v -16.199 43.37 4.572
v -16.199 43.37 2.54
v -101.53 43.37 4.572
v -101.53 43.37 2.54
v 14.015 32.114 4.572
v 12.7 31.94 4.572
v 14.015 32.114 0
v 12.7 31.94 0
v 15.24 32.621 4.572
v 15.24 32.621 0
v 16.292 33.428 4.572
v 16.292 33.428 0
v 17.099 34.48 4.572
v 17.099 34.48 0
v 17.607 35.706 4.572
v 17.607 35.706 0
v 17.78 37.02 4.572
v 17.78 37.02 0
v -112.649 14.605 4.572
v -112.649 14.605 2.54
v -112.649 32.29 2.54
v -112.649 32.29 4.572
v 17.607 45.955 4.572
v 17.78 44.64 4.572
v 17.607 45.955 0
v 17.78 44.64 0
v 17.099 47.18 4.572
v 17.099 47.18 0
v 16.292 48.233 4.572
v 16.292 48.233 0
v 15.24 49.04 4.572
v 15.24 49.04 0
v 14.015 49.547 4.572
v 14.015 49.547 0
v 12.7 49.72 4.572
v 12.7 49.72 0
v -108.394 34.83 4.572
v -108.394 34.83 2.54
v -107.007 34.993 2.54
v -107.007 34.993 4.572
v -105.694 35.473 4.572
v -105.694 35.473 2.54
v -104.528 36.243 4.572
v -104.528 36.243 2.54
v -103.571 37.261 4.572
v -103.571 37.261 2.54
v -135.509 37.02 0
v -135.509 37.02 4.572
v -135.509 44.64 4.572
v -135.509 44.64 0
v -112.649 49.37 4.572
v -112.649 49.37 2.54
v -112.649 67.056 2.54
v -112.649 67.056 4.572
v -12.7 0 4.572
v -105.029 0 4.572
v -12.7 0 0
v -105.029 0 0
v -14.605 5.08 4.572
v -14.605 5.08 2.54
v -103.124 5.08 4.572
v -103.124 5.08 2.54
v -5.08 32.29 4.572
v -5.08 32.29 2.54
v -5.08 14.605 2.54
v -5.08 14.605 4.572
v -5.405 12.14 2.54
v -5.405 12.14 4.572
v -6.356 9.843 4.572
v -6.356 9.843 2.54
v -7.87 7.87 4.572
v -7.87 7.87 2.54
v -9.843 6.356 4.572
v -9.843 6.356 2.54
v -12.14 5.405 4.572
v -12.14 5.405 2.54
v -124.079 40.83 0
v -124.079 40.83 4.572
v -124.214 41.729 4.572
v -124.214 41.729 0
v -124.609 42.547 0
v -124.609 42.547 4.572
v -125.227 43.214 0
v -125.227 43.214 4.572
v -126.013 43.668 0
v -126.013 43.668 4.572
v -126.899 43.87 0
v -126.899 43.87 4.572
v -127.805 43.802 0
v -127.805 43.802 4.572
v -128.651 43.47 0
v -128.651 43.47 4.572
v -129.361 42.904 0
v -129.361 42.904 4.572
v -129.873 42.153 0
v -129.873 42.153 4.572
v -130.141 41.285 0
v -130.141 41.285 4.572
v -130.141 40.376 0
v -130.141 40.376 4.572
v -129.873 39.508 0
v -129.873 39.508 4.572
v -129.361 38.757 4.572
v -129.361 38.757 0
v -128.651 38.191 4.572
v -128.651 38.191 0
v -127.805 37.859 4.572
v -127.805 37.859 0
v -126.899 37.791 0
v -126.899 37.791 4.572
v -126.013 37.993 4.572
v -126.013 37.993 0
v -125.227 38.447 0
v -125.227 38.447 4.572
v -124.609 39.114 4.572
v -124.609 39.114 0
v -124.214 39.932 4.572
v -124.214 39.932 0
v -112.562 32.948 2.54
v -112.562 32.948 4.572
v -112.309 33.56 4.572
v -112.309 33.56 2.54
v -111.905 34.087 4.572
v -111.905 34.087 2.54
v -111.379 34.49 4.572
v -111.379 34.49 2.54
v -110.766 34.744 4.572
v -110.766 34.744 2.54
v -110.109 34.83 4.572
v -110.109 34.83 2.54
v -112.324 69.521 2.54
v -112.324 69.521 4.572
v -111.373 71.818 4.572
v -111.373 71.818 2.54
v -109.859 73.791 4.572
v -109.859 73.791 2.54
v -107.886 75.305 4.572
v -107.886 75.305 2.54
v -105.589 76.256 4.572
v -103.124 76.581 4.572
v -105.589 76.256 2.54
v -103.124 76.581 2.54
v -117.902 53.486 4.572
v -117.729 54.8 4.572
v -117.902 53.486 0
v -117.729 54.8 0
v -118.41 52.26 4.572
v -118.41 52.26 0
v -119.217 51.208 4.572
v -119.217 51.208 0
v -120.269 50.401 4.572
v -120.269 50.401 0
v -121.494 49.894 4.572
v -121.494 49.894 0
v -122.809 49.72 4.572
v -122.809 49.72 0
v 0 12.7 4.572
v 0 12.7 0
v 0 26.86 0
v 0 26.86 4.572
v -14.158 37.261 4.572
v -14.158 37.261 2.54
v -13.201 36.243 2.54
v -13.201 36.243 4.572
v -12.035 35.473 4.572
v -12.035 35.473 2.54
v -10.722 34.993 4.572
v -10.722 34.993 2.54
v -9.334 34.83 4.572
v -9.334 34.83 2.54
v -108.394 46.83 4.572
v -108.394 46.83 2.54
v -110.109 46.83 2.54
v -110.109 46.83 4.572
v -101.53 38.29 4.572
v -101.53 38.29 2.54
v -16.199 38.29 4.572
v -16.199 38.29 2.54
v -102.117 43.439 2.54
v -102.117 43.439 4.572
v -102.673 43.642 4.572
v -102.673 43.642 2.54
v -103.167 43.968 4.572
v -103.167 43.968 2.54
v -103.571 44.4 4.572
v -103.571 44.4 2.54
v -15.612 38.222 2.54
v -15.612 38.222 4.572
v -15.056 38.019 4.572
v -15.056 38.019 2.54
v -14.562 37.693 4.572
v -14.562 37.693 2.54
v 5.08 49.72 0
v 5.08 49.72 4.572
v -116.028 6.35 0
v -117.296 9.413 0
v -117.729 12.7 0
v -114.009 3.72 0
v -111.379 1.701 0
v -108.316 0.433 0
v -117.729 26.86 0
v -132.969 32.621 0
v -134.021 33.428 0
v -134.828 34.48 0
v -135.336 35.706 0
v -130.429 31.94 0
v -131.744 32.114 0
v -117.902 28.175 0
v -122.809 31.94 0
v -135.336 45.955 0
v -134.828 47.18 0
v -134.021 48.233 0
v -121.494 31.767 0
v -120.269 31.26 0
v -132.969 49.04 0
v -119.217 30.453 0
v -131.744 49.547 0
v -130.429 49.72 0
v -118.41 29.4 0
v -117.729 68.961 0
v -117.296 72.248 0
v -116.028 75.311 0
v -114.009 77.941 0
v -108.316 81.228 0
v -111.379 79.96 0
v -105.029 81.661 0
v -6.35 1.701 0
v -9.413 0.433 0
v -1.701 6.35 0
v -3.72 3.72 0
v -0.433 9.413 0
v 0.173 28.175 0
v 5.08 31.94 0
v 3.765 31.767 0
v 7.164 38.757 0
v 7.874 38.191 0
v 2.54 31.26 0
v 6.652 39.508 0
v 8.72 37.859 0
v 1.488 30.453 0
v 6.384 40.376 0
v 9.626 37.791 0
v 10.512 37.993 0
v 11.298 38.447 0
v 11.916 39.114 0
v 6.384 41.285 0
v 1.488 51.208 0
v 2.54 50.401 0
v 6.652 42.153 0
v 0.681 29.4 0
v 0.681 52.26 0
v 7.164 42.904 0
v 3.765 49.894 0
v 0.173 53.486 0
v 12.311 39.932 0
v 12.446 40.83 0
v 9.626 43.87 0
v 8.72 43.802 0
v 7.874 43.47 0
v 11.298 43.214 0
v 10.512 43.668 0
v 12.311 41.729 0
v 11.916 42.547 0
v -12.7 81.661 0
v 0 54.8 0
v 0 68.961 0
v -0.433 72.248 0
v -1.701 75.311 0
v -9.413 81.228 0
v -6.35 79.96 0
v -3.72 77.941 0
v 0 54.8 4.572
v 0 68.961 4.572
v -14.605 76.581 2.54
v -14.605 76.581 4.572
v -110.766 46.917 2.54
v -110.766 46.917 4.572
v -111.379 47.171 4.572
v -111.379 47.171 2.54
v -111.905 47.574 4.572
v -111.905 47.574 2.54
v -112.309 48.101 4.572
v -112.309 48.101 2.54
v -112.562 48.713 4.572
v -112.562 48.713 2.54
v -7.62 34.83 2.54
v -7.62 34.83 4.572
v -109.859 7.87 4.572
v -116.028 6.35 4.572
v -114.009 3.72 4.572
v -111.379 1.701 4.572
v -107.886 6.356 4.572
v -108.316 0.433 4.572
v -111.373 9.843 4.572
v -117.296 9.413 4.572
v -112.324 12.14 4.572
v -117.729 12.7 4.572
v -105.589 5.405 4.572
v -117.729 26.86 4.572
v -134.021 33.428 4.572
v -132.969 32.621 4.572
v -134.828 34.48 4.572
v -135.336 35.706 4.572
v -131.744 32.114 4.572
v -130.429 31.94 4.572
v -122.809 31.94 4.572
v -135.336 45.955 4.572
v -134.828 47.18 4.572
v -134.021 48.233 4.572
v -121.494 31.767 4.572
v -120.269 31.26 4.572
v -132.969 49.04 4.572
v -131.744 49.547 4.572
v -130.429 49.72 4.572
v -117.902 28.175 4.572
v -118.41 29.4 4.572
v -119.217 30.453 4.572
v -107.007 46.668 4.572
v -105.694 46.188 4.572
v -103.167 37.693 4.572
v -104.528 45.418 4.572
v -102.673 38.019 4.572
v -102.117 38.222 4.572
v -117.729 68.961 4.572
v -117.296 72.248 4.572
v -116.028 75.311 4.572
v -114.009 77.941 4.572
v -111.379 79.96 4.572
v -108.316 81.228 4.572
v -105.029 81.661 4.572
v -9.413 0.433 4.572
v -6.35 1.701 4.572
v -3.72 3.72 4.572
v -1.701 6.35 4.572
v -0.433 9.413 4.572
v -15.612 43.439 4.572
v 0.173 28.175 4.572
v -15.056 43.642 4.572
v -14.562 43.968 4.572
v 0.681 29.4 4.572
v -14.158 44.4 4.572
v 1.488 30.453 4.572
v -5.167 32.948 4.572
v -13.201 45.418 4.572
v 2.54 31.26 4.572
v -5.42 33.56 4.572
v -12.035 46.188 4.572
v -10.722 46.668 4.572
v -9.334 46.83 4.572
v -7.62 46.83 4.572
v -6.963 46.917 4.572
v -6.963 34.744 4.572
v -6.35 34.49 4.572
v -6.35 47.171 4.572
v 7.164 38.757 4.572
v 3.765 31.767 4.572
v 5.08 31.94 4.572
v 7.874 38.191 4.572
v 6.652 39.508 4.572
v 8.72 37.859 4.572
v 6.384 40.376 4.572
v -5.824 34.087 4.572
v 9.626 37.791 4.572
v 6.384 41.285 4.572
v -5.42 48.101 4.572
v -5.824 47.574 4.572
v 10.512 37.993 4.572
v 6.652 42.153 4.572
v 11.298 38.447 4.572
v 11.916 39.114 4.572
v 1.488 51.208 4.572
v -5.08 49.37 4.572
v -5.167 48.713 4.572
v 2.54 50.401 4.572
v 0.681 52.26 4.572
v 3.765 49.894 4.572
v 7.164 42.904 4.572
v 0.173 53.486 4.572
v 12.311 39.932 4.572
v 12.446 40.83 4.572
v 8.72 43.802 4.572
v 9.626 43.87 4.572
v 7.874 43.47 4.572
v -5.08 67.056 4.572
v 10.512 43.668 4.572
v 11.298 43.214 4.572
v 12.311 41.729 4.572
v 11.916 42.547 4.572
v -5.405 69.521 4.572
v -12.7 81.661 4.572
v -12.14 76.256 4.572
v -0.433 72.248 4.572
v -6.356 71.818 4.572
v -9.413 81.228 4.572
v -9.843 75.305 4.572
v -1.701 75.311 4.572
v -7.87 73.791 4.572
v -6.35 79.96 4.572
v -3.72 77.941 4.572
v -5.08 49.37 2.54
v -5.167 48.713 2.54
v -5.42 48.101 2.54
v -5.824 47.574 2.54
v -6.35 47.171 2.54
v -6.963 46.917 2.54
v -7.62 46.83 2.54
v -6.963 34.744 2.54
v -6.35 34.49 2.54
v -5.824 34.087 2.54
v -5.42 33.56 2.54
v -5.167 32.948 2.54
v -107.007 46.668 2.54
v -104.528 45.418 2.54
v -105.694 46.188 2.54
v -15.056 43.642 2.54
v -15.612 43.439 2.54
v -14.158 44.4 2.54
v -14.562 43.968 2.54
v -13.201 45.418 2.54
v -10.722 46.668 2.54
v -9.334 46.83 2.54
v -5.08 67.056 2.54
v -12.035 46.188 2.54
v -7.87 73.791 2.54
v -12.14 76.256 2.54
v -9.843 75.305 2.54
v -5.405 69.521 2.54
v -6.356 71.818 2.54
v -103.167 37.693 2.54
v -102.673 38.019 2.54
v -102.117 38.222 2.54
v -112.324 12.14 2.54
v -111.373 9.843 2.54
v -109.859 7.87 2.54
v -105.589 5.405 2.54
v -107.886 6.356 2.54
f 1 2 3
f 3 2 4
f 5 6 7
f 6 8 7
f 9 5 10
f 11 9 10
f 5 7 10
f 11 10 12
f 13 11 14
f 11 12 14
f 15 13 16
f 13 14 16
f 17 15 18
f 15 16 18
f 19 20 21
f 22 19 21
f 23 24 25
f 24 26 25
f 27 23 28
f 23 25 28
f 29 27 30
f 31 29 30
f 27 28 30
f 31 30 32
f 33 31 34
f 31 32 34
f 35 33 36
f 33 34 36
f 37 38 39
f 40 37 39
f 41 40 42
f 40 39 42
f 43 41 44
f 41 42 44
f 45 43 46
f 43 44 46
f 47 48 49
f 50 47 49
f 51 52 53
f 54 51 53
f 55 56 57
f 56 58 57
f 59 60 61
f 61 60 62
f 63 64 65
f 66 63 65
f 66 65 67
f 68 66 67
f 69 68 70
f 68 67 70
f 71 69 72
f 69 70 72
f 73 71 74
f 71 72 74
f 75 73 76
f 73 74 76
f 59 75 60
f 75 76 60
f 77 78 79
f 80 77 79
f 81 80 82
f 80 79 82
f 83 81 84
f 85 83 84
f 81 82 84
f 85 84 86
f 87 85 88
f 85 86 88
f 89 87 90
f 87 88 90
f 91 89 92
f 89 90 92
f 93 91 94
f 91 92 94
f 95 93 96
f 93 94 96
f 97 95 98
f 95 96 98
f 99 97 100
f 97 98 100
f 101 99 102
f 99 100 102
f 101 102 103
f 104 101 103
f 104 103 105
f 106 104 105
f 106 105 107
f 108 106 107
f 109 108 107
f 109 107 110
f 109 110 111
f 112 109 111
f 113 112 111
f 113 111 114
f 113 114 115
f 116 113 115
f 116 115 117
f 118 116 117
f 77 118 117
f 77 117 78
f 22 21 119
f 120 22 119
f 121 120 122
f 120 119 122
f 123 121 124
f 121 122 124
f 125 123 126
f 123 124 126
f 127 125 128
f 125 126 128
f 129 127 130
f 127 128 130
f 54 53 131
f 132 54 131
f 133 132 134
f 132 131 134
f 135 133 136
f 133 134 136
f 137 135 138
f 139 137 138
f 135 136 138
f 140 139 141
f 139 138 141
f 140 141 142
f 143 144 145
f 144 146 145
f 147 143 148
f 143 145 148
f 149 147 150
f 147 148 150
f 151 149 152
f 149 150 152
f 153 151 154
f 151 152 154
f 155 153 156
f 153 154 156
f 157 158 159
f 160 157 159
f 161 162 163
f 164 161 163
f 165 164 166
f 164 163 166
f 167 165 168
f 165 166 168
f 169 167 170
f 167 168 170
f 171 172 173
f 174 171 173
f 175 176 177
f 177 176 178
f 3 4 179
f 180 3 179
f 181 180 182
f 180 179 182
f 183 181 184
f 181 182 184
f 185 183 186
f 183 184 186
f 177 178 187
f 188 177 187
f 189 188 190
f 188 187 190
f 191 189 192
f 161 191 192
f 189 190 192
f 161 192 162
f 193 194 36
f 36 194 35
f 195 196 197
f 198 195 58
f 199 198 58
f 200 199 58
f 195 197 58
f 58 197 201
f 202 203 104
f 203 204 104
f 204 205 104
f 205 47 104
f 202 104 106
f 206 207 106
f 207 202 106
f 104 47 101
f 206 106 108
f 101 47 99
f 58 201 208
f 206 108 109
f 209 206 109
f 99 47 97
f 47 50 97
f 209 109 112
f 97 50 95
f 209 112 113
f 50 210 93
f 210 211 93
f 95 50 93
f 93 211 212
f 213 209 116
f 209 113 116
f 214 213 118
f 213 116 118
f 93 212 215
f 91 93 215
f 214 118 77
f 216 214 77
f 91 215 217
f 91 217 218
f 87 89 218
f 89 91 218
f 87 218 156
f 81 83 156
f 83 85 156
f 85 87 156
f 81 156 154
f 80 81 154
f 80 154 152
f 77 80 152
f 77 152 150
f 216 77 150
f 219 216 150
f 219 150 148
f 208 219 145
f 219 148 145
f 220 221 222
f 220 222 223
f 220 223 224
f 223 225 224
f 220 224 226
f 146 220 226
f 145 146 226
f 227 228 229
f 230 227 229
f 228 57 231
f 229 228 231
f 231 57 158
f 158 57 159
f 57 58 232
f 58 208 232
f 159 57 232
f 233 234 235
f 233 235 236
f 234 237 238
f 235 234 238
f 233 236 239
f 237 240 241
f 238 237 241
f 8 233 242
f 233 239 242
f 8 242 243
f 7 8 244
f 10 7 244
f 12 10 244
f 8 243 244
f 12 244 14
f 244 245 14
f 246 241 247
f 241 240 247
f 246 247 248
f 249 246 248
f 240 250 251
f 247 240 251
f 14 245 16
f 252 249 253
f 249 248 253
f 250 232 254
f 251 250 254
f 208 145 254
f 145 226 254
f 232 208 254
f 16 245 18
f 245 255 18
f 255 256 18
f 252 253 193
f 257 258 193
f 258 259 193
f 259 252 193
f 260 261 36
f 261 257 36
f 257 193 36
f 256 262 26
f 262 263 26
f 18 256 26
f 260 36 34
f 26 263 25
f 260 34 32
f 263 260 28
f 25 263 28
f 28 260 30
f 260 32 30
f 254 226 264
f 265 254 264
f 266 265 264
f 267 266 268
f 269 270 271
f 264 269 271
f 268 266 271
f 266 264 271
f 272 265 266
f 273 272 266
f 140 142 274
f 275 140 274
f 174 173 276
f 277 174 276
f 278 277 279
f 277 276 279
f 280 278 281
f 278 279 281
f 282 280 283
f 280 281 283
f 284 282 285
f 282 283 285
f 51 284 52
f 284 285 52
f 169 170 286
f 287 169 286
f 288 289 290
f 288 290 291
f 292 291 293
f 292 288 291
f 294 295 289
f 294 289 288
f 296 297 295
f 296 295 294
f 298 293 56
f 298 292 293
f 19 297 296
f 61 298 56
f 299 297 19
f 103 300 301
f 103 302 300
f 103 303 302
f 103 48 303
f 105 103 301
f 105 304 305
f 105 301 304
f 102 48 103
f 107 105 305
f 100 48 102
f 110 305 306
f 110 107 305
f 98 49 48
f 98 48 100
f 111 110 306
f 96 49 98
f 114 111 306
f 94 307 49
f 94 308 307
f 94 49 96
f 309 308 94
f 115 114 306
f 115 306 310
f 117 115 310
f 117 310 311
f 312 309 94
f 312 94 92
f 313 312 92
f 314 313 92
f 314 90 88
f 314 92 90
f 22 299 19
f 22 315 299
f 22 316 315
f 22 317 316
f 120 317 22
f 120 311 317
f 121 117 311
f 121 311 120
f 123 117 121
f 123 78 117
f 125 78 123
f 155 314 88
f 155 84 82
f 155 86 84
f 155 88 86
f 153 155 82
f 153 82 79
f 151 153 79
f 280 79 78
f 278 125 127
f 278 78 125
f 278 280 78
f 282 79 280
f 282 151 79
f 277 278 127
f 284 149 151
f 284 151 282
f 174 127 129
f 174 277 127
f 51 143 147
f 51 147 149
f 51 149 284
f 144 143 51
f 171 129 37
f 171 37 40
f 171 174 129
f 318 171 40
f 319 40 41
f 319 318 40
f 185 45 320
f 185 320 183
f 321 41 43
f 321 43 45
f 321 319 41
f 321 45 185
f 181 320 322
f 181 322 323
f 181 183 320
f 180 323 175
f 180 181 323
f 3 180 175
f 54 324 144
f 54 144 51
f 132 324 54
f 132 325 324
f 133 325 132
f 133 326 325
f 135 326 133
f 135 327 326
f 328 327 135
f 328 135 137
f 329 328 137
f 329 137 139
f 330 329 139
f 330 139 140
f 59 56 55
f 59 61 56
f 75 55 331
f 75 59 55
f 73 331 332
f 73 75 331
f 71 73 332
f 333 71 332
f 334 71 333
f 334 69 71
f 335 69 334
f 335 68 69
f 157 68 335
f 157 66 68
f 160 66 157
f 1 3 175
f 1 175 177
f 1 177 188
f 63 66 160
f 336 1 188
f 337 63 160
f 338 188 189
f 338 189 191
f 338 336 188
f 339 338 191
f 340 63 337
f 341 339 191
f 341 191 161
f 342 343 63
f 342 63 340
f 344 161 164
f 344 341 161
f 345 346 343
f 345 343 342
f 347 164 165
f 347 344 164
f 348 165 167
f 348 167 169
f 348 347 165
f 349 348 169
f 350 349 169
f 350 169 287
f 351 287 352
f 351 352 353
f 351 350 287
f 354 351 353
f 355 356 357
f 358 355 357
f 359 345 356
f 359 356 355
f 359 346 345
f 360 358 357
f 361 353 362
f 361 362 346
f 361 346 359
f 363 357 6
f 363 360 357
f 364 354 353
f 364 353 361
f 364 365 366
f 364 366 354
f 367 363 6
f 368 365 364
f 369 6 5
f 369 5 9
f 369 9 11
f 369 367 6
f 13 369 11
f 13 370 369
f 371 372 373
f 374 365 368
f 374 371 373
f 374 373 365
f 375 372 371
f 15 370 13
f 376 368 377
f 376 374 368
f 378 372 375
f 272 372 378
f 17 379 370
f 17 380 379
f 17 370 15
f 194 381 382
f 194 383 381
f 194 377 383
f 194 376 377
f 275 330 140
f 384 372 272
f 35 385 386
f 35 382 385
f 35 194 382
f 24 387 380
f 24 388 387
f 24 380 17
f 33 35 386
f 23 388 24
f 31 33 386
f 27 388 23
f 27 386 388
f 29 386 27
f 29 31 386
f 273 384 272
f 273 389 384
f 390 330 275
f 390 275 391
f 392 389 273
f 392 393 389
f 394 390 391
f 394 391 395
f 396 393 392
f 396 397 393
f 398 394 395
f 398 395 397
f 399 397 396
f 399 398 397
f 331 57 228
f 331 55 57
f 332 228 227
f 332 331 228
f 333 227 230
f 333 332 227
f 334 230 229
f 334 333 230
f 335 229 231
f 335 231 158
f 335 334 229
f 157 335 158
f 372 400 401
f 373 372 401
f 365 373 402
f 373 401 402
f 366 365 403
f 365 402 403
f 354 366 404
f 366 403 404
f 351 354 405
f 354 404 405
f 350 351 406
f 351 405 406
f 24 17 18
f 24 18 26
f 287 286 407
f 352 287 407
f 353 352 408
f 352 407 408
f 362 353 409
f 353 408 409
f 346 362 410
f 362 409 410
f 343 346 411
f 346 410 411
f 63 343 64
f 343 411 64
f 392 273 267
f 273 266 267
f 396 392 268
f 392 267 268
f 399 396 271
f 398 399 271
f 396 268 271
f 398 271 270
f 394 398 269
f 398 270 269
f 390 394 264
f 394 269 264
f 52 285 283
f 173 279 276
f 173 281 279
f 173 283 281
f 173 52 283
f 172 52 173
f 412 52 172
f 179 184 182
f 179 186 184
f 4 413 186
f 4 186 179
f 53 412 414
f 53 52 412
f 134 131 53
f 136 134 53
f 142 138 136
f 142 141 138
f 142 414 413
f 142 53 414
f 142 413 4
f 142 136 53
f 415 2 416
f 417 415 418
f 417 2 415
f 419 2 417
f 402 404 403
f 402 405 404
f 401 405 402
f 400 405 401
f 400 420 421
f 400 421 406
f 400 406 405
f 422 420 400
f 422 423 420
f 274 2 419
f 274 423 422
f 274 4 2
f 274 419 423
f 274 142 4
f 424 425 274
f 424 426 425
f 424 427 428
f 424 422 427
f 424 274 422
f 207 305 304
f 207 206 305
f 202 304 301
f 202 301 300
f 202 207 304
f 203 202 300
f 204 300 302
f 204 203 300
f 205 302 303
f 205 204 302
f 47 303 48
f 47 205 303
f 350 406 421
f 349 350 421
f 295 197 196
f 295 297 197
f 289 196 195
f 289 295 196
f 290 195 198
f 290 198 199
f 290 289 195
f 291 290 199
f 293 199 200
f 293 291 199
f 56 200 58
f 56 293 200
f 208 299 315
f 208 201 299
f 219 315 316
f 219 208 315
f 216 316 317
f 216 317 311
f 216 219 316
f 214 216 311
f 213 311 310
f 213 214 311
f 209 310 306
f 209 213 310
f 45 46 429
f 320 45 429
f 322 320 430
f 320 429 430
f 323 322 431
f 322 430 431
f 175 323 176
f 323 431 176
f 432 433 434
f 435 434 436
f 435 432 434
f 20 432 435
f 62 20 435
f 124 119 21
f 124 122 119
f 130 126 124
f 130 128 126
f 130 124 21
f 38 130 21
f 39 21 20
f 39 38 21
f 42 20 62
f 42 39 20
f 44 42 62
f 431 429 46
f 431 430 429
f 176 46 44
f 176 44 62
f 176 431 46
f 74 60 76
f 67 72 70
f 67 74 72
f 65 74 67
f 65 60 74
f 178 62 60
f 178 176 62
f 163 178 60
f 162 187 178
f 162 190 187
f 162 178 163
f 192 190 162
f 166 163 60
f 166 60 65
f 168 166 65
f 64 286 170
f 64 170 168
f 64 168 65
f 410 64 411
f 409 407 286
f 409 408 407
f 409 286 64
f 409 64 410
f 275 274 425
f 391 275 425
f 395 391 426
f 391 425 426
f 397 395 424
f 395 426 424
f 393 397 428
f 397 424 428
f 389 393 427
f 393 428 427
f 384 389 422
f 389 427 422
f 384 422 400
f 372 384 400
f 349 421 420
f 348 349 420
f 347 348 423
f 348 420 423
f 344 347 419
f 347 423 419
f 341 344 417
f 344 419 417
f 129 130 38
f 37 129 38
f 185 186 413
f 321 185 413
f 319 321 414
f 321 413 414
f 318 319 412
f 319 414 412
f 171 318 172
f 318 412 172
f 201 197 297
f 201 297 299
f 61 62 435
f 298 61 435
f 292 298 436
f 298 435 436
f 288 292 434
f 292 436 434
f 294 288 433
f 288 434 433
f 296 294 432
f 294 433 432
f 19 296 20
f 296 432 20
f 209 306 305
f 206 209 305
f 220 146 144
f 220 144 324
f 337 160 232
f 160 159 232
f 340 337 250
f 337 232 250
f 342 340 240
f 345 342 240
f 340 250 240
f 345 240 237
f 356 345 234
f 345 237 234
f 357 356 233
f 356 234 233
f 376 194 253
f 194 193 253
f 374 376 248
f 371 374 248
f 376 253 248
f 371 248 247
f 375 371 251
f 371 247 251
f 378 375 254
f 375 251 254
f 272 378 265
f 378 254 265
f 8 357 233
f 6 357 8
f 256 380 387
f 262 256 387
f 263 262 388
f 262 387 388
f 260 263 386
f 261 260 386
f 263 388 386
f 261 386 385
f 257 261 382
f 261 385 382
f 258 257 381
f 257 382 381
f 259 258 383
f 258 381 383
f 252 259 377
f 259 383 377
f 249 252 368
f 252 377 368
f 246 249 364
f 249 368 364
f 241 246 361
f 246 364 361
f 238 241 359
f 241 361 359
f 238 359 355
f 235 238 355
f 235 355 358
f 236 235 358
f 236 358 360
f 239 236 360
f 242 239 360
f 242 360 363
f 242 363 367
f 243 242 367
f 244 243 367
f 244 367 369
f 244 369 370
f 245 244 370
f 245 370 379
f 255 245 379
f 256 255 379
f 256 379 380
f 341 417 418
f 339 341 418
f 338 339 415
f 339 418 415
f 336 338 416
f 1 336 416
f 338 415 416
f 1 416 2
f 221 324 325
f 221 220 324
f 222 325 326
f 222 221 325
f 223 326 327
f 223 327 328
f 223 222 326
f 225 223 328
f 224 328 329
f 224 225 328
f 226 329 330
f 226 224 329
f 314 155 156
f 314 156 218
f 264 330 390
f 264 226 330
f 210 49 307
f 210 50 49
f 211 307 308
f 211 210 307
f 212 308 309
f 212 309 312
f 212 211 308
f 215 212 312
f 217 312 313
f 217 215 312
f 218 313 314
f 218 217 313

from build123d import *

# Parameters (mm, degrees)
F0_W      = 117.729
F0_H      = 81.661
F1_DEPTH  = 2.54
F2_W      = 117.729
F2_H      = 81.661
F3_DEPTH  = 2.032
F4_R      = 12.7
F5_W      = 17.78
F5_H      = 17.78
F6_DEPTH  = 4.572
F7_R      = 5.08
F13_R     = 3.048
F14_DEPTH = 4.573


# Not quite as in the source:
# - a feature of the source that left no trace in its solid (it failed there, or was rolled back) is left out
# - a pattern or mirror of a feature is missing from the dataset's text; its kind, count and spacing are read off the source's solid


with BuildPart() as f1:
    # F0 (on Top) → F1 (new body)
    with BuildSketch(Plane.XY):
        with Locations((-58.8645, 40.8305)):
            Rectangle(F0_W, F0_H)
    extrude(amount=F1_DEPTH)

    # F2 (on face) → F3 (join)
    with BuildSketch(Plane.XY.offset(2.54)):
        with Locations((-58.8645, 40.8305)):
            Rectangle(F2_W, F2_H)
        with BuildLine():
            ThreePointArc((-5.08, 14.605), (-7.8698079092, 7.8698079092), (-14.605, 5.08))
            Line((-14.605, 5.08), (-103.124, 5.08))
            ThreePointArc((-103.124, 5.08), (-109.8591920908, 7.8698079092), (-112.649, 14.605))
            Line((-112.649, 14.605), (-112.649, 32.2905))
            ThreePointArc((-112.649, 32.2905), (-111.9050512242, 34.0865512242), (-110.109, 34.8305))
            Line((-110.109, 34.8305), (-108.3945, 34.8305))
            ThreePointArc((-108.3945, 34.8305), (-105.6939926316, 35.4725843649), (-103.5714697827, 37.2614133489))
            ThreePointArc((-103.5714697827, 37.2614133489), (-102.67293511, 38.0186842855), (-101.529720324, 38.2905))
            Line((-101.529720324, 38.2905), (-58.8645, 38.2905))
            Line((-58.8645, 38.2905), (-16.199279676, 38.2905))
            ThreePointArc((-16.199279676, 38.2905), (-15.05606489, 38.0186842855), (-14.1575302173, 37.2614133489))
            ThreePointArc((-14.1575302173, 37.2614133489), (-12.0350073684, 35.4725843649), (-9.3345, 34.8305))
            Line((-9.3345, 34.8305), (-7.62, 34.8305))
            ThreePointArc((-7.62, 34.8305), (-5.8239487758, 34.0865512242), (-5.08, 32.2905))
            Line((-5.08, 32.2905), (-5.08, 14.605))
        make_face(mode=Mode.SUBTRACT)
        with BuildLine():
            Line((-103.124, 76.581), (-14.605, 76.581))
            ThreePointArc((-14.605, 76.581), (-7.8698079092, 73.7911920908), (-5.08, 67.056))
            Line((-5.08, 67.056), (-5.08, 49.3705))
            ThreePointArc((-5.08, 49.3705), (-5.8239487758, 47.5744487758), (-7.62, 46.8305))
            Line((-7.62, 46.8305), (-9.3345, 46.8305))
            ThreePointArc((-9.3345, 46.8305), (-12.0350073684, 46.1884156351), (-14.1575302173, 44.3995866511))
            ThreePointArc((-14.1575302173, 44.3995866511), (-15.05606489, 43.6423157145), (-16.199279676, 43.3705))
            Line((-16.199279676, 43.3705), (-58.8645, 43.3705))
            Line((-58.8645, 43.3705), (-101.529720324, 43.3705))
            ThreePointArc((-101.529720324, 43.3705), (-102.67293511, 43.6423157145), (-103.5714697827, 44.3995866511))
            ThreePointArc((-103.5714697827, 44.3995866511), (-105.6939926316, 46.1884156351), (-108.3945, 46.8305))
            Line((-108.3945, 46.8305), (-110.109, 46.8305))
            ThreePointArc((-110.109, 46.8305), (-111.9050512242, 47.5744487758), (-112.649, 49.3705))
            Line((-112.649, 49.3705), (-112.649, 67.056))
            ThreePointArc((-112.649, 67.056), (-109.8591920908, 73.7911920908), (-103.124, 76.581))
        make_face(mode=Mode.SUBTRACT)
    extrude(amount=F3_DEPTH)

    # F4
    f4_edges = [f1.edges().sort_by_distance(p)[0] for p in [
        (-117.729, 0, 2.286),
        (-117.729, 81.661, 2.286),
        (0, 81.661, 2.286),
        (0, 0, 2.286),
    ]]
    fillet(f4_edges, radius=F4_R)

    # F5 (on face) → F6 (join, through all)
    with BuildSketch(Plane.XY.offset(4.572)):
        with Locations((8.89, 40.8305)):
            Rectangle(F5_W, F5_H)
    f6 = extrude(amount=-F6_DEPTH)

    # F6_copies: F6 across plane
    add(f6.mirror(Plane(origin=(-58.8645, 0, 0), x_dir=(0, 0, -1), z_dir=(-1, 0, 0))))

    # F7
    f7_edges = [f1.edges().sort_by_distance(p)[0] for p in [
        (0, 31.9405, 2.286),
        (0, 49.7205, 2.286),
        (17.78, 49.7205, 2.286),
        (17.78, 31.9405, 2.286),
        (-117.729, 49.7205, 2.286),
        (-117.729, 31.9405, 2.286),
        (-135.509, 49.7205, 2.286),
        (-135.509, 31.9405, 2.286),
    ]]
    fillet(f7_edges, radius=F7_R)

    # F13 (on face) → F14 (cut, through all)
    with BuildSketch(Plane.XY.offset(4.572)):
        with Locations((9.398, 40.8305)):
            Circle(F13_R)
        with Locations((-127.127, 40.8305)):
            Circle(F13_R)
    extrude(amount=-F14_DEPTH, mode=Mode.SUBTRACT)


solid = f1.part
